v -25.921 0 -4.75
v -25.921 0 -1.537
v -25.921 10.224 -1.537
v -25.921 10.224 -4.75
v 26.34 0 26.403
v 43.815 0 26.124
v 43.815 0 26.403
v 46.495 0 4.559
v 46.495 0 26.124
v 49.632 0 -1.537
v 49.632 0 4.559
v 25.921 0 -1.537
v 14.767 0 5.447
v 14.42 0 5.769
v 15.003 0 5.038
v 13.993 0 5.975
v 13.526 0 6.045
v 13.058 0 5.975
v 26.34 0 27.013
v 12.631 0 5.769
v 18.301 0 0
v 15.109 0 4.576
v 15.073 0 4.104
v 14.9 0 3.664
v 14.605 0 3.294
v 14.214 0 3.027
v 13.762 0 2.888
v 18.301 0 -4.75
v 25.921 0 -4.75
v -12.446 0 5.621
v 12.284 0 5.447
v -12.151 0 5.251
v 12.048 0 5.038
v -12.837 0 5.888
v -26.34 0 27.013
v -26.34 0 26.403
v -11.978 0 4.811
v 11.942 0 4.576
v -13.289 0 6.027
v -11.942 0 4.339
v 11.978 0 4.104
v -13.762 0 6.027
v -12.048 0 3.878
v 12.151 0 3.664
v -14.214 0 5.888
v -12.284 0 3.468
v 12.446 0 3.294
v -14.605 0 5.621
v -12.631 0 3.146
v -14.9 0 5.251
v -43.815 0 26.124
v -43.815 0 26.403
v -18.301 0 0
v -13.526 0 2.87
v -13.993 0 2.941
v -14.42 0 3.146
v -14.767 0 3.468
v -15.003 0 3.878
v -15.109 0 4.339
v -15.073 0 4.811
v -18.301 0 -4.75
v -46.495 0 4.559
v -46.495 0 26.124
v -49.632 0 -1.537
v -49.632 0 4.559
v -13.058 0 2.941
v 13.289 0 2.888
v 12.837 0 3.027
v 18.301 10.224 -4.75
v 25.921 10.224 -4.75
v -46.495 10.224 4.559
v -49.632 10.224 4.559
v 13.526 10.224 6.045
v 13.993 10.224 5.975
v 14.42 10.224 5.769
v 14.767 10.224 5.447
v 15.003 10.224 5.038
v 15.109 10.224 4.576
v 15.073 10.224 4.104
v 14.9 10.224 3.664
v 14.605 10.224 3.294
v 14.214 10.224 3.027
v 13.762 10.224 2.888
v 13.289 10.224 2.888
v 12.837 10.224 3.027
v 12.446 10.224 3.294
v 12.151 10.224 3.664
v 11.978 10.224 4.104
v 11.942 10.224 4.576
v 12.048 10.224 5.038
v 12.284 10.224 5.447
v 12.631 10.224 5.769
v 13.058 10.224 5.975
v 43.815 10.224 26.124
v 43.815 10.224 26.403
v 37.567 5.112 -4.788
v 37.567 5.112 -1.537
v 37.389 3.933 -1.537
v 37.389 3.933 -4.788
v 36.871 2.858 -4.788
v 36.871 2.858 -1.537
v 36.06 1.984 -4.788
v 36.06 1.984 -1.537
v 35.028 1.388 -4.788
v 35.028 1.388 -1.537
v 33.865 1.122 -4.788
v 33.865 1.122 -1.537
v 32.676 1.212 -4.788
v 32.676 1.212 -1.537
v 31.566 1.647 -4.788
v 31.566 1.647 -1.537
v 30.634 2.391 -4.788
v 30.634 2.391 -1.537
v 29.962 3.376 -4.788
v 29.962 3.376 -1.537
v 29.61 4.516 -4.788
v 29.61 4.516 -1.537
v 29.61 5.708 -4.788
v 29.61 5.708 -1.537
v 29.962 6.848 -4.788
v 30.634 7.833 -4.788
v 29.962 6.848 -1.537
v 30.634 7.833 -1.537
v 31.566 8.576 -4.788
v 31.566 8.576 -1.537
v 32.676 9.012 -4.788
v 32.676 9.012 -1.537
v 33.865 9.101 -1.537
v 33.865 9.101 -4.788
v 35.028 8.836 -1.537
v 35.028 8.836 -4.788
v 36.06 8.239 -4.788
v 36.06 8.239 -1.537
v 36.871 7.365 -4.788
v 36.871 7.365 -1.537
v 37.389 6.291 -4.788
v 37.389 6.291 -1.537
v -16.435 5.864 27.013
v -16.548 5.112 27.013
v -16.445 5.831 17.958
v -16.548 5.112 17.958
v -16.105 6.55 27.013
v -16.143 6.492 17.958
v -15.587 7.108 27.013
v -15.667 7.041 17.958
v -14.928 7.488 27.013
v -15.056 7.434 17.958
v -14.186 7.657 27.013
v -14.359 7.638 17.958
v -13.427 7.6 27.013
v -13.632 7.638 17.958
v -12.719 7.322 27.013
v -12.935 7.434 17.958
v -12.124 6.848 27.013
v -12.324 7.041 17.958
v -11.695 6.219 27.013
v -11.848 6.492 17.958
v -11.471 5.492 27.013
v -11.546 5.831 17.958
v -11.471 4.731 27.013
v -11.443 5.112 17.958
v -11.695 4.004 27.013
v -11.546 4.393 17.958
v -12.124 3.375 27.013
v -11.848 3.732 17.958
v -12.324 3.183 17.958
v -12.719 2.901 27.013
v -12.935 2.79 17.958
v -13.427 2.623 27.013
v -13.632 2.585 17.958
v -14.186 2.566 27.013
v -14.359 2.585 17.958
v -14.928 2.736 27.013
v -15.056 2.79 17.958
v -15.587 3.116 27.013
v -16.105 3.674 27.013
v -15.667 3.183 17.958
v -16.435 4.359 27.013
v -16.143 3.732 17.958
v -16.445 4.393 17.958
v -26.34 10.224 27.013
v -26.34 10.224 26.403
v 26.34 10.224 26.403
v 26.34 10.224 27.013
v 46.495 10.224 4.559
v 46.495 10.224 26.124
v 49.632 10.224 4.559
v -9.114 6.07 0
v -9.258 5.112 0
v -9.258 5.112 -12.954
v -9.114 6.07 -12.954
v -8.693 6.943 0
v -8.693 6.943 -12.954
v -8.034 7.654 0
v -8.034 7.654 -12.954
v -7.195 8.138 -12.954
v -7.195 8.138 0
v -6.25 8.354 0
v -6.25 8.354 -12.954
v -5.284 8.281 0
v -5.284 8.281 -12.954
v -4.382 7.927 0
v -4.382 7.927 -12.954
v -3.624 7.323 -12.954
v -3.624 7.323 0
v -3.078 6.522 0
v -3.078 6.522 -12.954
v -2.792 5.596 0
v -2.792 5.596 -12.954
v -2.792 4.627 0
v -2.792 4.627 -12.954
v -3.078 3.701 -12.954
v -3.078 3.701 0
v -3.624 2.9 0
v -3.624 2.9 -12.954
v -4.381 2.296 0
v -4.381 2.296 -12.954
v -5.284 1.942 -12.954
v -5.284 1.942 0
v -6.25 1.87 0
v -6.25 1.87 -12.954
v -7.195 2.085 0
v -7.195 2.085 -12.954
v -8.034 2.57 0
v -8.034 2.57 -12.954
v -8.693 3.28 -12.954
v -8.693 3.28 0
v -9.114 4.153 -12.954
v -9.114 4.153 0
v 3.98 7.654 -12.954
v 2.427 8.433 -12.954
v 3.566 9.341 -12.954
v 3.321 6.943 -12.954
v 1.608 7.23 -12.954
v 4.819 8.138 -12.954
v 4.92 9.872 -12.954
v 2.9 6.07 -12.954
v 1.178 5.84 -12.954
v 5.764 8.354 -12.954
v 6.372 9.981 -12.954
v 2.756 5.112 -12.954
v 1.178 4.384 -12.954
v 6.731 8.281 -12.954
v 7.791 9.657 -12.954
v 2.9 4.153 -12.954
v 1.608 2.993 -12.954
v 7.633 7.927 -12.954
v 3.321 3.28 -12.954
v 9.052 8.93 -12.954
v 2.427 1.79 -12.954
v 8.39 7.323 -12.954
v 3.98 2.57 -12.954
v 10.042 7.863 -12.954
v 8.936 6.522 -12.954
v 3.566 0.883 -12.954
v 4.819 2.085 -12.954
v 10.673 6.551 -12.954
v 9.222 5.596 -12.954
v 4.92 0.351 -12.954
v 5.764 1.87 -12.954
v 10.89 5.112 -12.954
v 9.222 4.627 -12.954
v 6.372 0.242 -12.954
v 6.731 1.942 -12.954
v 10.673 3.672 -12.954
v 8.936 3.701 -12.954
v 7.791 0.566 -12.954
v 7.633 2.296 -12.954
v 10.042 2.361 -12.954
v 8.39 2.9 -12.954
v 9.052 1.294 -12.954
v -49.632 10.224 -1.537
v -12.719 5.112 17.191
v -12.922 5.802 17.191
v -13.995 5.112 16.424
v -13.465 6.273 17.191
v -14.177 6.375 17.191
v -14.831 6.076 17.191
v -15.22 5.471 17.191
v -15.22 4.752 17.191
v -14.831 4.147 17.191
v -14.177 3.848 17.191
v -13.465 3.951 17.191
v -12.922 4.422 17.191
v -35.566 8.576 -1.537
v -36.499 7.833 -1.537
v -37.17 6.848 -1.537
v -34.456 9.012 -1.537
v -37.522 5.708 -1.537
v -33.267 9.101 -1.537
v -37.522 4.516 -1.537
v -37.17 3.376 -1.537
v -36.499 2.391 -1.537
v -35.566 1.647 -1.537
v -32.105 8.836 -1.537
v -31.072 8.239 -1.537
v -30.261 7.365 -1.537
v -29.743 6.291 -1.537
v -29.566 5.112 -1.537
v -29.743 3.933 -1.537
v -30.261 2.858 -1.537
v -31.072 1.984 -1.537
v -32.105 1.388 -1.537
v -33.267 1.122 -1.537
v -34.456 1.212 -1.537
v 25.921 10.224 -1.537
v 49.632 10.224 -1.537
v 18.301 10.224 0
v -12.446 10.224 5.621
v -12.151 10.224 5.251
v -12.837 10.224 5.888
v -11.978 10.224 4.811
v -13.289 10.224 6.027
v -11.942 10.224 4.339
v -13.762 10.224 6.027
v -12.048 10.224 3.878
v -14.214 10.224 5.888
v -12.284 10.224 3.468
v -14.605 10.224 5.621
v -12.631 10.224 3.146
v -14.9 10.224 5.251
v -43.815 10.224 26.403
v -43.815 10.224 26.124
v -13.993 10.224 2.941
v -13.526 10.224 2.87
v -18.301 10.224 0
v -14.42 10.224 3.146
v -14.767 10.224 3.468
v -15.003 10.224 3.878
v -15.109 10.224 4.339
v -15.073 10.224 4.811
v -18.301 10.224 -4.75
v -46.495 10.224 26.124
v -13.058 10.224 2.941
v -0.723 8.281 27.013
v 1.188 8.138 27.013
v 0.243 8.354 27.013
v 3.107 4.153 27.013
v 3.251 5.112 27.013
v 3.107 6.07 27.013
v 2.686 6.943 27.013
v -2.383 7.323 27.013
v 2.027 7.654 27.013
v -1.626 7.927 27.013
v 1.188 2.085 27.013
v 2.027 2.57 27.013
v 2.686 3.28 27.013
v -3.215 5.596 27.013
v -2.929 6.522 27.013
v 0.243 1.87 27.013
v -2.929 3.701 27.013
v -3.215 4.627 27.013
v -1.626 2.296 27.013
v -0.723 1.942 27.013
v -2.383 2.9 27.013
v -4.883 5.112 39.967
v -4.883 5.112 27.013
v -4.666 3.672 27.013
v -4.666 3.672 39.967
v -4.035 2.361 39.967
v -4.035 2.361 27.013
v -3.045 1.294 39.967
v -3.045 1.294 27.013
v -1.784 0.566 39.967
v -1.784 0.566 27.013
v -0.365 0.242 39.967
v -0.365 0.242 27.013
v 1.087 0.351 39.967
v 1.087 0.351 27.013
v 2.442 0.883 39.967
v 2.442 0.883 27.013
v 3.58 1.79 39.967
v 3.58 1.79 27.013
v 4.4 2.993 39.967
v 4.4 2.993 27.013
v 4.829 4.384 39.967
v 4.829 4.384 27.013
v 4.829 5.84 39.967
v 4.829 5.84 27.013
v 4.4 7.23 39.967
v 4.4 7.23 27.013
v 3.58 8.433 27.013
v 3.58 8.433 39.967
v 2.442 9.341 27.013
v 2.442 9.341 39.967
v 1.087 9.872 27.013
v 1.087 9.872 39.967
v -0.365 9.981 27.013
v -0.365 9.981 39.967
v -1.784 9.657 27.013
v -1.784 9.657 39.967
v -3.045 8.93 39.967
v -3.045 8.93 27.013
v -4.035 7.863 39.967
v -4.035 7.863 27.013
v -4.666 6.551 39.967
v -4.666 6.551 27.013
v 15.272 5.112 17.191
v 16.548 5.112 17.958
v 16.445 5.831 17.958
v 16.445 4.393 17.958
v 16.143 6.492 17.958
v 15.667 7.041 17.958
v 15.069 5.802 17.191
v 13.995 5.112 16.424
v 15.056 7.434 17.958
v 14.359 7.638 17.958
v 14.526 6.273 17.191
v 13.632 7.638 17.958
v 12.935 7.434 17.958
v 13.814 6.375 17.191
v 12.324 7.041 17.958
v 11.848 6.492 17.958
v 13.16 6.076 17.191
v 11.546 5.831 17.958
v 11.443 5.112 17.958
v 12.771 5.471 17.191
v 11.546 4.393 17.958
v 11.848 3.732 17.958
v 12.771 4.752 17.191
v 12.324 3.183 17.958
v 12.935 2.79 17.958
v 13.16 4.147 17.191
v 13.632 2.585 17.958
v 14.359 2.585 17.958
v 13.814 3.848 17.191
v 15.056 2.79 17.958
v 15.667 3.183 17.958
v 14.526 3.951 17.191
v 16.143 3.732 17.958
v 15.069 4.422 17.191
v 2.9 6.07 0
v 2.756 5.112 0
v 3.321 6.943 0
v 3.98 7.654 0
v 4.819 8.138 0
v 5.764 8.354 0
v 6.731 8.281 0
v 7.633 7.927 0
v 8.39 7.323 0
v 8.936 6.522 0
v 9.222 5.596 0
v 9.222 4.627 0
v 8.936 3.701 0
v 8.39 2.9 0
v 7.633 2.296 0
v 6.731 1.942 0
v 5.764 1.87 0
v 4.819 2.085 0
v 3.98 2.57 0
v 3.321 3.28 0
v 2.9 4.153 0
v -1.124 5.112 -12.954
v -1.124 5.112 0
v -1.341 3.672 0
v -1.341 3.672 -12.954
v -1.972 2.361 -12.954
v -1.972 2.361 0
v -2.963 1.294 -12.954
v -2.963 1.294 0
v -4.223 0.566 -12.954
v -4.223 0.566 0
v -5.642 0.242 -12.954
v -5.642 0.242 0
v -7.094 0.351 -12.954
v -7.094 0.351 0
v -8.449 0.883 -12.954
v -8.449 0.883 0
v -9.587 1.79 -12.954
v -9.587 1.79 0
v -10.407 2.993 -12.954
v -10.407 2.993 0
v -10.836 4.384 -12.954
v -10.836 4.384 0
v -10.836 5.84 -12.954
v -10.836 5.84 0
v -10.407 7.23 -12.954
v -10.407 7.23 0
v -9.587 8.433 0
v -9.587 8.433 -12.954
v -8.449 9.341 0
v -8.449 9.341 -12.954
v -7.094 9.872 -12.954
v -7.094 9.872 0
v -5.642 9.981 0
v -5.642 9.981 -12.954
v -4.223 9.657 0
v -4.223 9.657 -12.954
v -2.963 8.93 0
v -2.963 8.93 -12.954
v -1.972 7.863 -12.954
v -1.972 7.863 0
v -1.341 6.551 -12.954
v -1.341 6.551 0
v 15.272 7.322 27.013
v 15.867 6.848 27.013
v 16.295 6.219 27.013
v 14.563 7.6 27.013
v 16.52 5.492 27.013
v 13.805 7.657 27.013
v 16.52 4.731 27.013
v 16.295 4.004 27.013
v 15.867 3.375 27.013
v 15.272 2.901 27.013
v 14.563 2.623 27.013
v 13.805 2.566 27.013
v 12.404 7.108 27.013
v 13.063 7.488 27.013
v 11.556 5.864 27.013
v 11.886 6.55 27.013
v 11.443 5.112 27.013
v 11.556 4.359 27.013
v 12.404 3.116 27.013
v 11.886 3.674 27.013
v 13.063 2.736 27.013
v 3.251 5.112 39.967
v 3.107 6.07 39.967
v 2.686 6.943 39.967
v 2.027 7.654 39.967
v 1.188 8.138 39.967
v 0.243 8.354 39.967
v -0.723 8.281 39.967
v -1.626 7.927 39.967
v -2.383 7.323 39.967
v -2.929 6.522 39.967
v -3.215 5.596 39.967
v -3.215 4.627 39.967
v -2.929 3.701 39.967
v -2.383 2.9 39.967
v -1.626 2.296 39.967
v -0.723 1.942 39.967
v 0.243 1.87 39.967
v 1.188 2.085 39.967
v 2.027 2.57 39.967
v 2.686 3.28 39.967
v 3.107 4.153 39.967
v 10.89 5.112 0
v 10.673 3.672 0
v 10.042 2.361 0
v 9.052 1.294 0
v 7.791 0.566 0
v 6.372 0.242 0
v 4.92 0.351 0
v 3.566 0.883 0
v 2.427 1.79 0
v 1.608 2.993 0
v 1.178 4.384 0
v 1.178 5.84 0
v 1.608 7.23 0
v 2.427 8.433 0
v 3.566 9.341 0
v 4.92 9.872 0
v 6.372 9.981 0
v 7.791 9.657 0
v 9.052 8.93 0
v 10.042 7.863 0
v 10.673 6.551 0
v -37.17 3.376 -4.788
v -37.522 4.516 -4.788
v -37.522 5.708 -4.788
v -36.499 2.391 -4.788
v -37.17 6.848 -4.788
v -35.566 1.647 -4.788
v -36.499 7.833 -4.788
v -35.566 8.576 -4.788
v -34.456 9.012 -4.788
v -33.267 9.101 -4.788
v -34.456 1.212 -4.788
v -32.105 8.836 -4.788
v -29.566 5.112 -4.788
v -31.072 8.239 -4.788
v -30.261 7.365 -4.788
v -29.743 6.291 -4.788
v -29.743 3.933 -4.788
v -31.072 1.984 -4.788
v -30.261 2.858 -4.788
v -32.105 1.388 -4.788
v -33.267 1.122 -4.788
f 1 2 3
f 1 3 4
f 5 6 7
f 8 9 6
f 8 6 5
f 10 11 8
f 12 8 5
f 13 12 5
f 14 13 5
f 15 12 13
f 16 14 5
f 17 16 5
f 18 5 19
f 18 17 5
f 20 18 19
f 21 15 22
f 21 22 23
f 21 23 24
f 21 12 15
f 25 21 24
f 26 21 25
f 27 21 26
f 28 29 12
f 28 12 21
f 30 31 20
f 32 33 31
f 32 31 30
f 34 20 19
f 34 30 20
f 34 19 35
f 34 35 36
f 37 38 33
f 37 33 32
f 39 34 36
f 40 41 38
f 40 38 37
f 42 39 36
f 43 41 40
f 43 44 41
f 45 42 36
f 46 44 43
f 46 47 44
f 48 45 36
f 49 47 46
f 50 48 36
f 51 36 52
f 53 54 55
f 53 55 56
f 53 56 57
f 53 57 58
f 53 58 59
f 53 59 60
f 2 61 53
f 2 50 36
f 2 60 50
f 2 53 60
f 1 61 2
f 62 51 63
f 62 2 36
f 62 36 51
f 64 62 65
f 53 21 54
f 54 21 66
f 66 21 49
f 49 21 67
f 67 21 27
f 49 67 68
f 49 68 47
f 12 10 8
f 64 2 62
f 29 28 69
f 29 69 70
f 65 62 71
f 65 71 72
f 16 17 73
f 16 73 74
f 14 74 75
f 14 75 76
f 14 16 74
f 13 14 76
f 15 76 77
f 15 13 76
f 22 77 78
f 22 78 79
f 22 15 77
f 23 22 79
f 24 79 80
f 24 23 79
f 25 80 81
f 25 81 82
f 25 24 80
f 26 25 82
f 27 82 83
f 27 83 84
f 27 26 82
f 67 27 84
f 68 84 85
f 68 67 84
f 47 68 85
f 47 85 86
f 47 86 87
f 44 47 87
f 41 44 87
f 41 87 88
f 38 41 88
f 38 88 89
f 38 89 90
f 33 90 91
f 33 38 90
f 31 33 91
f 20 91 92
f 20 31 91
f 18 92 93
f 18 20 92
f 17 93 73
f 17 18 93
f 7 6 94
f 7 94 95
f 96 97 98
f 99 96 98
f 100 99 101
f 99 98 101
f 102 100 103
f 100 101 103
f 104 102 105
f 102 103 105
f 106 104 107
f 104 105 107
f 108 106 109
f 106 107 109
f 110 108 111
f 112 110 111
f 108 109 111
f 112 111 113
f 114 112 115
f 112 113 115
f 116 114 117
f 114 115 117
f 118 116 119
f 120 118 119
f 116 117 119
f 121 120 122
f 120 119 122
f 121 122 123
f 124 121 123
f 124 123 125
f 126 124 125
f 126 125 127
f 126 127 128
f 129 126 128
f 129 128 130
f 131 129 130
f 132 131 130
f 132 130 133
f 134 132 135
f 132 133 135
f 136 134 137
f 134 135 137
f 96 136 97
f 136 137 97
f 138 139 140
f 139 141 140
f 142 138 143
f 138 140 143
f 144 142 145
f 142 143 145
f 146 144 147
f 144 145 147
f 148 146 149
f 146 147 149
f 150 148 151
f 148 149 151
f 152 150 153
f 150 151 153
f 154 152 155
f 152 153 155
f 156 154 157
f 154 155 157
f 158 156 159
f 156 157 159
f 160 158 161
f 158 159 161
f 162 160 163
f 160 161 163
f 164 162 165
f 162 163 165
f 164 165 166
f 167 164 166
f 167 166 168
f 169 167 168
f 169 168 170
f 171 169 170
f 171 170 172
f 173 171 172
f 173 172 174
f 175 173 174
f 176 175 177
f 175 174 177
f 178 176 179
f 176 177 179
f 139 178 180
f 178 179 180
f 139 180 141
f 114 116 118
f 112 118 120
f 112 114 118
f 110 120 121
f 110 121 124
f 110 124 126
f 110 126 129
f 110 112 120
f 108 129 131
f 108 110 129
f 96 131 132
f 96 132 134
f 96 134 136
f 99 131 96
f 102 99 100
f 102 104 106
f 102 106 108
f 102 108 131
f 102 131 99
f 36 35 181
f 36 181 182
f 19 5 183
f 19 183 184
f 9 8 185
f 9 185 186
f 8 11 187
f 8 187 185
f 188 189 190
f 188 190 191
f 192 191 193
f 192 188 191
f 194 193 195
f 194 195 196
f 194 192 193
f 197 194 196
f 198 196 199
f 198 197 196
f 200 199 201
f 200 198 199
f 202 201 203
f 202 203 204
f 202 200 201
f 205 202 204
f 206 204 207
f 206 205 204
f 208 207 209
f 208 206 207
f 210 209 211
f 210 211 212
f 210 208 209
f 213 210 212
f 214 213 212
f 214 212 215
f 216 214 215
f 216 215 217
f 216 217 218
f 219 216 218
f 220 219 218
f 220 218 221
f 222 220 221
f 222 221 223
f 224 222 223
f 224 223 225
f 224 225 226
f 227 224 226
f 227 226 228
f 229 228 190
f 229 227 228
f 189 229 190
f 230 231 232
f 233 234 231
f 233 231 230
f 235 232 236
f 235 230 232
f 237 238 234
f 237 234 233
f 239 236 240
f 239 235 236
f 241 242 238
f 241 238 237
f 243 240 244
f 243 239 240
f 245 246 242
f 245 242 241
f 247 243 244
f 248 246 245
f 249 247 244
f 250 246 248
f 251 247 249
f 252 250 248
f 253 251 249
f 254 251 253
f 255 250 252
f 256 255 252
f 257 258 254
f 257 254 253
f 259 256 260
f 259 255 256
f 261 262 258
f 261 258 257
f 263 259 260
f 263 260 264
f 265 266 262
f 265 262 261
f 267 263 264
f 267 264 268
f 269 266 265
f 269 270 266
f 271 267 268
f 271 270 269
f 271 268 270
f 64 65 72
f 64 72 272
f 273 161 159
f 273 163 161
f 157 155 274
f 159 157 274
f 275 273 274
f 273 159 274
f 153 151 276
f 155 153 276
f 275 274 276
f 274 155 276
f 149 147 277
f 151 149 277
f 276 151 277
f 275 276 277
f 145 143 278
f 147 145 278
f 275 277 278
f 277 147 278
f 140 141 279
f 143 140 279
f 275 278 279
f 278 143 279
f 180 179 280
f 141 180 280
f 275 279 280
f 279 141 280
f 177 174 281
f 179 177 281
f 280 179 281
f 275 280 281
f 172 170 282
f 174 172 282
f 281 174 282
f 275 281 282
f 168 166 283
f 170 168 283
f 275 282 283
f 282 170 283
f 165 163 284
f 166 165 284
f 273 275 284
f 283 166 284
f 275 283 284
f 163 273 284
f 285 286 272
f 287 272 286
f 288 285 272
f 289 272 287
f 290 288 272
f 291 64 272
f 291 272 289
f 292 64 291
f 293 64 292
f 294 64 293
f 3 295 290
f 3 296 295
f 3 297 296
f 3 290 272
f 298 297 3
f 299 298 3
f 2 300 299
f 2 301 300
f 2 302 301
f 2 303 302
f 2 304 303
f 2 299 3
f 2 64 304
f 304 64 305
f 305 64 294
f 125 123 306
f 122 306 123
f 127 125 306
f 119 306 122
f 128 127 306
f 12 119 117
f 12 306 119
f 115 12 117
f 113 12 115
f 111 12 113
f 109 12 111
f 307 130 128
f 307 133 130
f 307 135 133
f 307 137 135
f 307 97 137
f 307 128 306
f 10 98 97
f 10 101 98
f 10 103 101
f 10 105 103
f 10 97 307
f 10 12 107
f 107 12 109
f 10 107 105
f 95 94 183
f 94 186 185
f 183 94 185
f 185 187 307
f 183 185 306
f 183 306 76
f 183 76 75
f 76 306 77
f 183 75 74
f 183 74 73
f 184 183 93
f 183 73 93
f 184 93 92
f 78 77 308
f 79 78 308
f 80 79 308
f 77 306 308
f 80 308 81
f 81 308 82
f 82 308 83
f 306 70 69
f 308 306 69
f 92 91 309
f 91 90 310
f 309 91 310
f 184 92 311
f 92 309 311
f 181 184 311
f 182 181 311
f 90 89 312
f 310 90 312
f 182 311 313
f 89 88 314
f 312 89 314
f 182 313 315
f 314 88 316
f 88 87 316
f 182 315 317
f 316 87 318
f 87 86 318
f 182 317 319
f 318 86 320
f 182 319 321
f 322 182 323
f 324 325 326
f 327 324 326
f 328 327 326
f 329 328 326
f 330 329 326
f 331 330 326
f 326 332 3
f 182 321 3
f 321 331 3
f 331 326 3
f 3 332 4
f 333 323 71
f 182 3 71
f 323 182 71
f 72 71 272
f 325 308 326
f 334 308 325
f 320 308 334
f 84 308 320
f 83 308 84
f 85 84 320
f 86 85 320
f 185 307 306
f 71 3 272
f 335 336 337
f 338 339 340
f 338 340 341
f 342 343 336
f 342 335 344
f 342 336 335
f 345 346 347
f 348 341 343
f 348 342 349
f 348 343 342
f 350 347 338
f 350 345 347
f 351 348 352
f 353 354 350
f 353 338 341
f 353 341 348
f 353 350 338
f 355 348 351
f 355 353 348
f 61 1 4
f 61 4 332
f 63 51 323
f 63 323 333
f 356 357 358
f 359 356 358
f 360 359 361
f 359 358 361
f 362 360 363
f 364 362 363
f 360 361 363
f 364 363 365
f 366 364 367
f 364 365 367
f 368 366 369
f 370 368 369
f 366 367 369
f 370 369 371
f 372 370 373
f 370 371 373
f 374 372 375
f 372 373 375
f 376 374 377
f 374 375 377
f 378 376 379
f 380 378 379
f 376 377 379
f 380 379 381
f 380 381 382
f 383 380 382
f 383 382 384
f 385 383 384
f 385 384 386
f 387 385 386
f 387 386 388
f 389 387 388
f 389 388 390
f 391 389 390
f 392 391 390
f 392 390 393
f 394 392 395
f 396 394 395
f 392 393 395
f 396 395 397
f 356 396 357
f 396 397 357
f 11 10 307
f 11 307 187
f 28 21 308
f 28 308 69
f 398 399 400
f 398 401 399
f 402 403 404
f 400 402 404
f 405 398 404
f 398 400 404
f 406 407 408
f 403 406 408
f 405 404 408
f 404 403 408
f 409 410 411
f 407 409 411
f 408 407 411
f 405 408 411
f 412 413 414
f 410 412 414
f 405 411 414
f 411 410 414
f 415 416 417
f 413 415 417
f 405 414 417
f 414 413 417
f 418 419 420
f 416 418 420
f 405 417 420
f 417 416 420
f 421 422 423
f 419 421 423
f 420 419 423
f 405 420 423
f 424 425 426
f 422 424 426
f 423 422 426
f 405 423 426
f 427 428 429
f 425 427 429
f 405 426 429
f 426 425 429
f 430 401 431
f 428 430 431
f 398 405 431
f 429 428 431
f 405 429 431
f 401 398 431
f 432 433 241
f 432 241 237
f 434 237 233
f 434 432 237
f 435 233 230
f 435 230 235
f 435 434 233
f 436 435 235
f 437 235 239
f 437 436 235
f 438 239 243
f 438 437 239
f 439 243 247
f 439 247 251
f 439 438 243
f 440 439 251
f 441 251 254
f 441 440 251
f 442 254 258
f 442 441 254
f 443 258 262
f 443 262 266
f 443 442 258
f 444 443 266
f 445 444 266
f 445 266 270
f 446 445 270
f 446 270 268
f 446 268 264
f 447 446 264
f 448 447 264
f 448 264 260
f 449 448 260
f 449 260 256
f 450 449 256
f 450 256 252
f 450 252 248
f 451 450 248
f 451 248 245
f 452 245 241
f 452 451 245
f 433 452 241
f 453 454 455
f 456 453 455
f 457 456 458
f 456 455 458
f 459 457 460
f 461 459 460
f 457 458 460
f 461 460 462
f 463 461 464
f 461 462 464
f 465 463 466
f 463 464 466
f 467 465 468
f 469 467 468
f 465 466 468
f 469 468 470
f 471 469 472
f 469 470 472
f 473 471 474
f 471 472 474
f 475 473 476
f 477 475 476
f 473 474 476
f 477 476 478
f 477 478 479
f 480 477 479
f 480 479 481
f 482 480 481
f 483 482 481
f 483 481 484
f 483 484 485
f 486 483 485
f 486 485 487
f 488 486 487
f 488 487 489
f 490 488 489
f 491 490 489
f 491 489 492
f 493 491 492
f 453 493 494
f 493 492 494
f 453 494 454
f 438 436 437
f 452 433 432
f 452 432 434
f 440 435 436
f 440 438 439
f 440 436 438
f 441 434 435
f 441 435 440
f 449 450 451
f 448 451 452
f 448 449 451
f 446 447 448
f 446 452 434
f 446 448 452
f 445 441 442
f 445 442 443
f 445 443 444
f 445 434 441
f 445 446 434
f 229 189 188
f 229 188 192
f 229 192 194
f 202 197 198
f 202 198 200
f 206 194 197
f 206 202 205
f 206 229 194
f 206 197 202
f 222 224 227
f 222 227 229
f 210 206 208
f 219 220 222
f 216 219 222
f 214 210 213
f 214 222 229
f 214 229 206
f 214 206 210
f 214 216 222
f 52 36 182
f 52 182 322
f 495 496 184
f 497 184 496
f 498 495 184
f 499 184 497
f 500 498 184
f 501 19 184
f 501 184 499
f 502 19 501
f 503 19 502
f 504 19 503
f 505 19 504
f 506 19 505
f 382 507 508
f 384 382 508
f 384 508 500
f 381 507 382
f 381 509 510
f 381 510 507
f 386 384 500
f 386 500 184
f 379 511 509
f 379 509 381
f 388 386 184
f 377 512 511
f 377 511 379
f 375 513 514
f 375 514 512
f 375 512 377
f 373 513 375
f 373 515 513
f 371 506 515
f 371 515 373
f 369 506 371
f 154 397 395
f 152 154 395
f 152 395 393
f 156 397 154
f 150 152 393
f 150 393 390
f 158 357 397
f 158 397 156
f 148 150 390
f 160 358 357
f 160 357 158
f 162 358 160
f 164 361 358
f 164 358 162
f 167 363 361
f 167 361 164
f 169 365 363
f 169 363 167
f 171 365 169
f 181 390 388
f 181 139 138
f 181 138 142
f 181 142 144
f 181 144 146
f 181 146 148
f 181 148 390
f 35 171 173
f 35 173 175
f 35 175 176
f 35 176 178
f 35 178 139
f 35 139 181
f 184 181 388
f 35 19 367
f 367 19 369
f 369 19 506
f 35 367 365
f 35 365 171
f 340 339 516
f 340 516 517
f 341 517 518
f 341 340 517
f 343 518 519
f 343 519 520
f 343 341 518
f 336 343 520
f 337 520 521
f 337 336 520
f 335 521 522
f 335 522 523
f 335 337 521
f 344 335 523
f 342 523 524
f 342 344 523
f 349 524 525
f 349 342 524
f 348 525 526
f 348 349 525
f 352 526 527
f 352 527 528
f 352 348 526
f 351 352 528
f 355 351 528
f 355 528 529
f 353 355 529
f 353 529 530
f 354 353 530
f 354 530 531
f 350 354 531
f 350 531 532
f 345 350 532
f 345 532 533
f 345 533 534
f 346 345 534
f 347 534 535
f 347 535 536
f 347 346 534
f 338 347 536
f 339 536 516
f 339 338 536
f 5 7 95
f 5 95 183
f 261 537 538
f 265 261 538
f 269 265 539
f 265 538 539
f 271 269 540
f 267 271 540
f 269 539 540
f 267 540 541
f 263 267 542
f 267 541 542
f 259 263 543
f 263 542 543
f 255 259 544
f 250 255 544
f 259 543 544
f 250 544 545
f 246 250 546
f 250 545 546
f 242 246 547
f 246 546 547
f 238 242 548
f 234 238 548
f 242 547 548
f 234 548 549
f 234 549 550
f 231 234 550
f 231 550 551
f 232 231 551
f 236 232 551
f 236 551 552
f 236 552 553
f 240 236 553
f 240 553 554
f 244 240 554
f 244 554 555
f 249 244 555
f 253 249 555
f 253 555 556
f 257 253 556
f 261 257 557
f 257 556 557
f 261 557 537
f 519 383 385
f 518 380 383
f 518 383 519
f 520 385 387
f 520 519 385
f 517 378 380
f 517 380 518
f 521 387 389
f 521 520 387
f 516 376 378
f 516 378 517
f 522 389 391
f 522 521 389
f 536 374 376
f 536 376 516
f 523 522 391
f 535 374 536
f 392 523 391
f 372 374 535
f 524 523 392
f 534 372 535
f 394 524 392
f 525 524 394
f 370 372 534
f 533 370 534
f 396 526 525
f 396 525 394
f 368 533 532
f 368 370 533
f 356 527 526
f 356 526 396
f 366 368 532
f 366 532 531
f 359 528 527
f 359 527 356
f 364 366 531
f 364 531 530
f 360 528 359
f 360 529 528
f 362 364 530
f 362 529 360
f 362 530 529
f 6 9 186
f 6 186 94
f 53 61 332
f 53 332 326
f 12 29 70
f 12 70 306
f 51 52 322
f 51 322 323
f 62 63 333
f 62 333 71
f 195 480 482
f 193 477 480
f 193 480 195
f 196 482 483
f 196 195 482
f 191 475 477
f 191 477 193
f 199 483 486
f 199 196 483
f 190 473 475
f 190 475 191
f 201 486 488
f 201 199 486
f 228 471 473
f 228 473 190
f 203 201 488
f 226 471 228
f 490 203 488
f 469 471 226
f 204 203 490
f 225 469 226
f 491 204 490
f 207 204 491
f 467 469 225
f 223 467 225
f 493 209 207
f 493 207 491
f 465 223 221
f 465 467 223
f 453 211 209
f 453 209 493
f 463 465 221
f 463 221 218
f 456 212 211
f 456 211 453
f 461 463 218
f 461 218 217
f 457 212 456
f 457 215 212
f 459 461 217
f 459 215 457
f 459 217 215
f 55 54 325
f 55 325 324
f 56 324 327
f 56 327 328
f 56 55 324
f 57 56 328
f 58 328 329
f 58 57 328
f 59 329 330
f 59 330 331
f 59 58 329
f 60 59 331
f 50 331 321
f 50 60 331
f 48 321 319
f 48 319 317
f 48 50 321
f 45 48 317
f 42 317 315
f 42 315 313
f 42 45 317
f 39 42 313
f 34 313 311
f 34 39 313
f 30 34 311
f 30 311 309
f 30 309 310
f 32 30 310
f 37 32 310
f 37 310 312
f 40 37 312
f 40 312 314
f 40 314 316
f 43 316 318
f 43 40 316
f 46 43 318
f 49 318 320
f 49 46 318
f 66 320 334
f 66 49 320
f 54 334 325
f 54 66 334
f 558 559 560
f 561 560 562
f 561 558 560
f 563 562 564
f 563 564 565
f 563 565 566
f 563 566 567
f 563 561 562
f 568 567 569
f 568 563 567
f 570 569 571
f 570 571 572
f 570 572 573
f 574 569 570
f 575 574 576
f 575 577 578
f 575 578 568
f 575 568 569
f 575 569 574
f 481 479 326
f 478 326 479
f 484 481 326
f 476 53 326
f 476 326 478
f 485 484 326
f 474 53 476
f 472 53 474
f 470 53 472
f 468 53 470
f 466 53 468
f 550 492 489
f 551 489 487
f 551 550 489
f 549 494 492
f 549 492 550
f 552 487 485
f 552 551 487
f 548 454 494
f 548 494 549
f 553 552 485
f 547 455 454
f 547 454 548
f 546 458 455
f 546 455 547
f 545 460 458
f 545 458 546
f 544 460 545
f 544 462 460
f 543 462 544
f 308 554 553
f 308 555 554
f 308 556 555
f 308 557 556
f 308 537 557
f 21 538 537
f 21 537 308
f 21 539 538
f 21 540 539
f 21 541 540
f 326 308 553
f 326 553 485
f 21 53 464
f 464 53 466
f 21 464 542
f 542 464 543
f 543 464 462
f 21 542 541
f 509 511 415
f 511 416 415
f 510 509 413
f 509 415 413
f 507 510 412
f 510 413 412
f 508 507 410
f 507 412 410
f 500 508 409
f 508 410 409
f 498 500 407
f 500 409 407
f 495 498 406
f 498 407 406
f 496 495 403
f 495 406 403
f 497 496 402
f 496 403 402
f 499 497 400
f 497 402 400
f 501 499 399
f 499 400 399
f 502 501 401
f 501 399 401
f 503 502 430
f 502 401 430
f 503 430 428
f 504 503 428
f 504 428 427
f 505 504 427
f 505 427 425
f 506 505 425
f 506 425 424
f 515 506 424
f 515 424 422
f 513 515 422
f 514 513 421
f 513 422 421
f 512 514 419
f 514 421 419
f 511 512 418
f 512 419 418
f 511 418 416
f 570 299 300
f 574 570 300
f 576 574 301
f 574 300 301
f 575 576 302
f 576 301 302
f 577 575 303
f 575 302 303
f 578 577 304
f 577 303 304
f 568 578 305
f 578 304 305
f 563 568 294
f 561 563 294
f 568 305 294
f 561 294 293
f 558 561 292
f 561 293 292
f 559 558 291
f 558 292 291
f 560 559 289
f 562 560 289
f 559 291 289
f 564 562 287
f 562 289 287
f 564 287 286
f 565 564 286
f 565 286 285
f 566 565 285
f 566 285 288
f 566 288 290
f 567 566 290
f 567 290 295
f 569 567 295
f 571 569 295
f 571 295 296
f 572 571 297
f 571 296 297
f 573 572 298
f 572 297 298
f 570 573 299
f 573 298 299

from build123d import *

# Parameters (mm, degrees)
SKETCH1_R                       = 1.5875
BOSS_EXTRUDE1_DEPTH             = 10.2235
SKETCH2_R                       = 4.88315
SKETCH2_R_2                     = 3.2512
BOSS_EXTRUDE2_DEPTH             = 12.954
SKETCH3_R                       = 4.88315
SKETCH3_R_2                     = 3.2512
BOSS_EXTRUDE3_DEPTH             = 12.954
TAP_DRILL_FOR_1_4_20_TAP1_D     = 5.1054
TAP_DRILL_FOR_1_4_20_TAP1_DEPTH = 9.0551
TAP_DRILL_FOR_1_4_20_TAP1_TIP   = 1.533816902
SKETCH6_R                       = 4.0005
BOSS_EXTRUDE4_DEPTH             = 3.2512


with BuildPart() as part:
    # Sketch1 → Boss-Extrude1 (new body)
    with BuildSketch(Plane(origin=(0, 0, 0), x_dir=(1, 0, 0), z_dir=(0, 1, 0))):
        Polygon((-18.3007, 0), (18.3007, 0), (18.3007, 4.7498), (25.9207, 4.7498), (25.9207, 1.5367), (49.6316, 1.5367), (49.6316, -4.5593), (46.4947, -4.5593), (46.4947, -26.1239), (43.815, -26.1239), (43.815, -26.4033), (26.3398, -26.4033), (26.3398, -27.0129), (-26.3398, -27.0129), (-26.3398, -26.4033), (-43.815, -26.4033), (-43.815, -26.1239), (-46.4947, -26.1239), (-46.4947, -4.5593), (-49.6316, -4.5593), (-49.6316, 1.5367), (-25.9207, 1.5367), (-25.9207, 4.7498), (-18.3007, 4.7498), align=None)
        with Locations(Location((13.5255, -4.4577, 0), (0, 0, 270))):
            Circle(SKETCH1_R, mode=Mode.SUBTRACT)
        with Locations(Location((-13.5255, -4.4577, 0), (0, 0, 90))):
            Circle(SKETCH1_R, mode=Mode.SUBTRACT)
    extrude(amount=BOSS_EXTRUDE1_DEPTH)

    # Sketch2 → Boss-Extrude2 (add)
    with BuildSketch(Plane.XY.offset(27.0129)):
        with Locations(Location((0, 5.11175, 0), (0, 0, 180))):
            Circle(SKETCH2_R)
        with Locations((0, 5.11175)):
            Circle(SKETCH2_R_2, mode=Mode.SUBTRACT)
    extrude(amount=BOSS_EXTRUDE2_DEPTH)

    # Sketch3 → Boss-Extrude3 (add)
    # profile 1 of 2: a face of its own
    with BuildSketch(Plane(origin=(0, 0, 0), x_dir=(-1, 0, 0), z_dir=(0, 0, -1))):
        with Locations(Location((6.0071, 5.11175, 0), (0, 0, 180))):
            Circle(SKETCH3_R)
        with Locations((6.0071, 5.11175)):
            Circle(SKETCH3_R_2, mode=Mode.SUBTRACT)
    # profile 2 of 2: a face of its own
    with BuildSketch(Plane(origin=(0, 0, 0), x_dir=(-1, 0, 0), z_dir=(0, 0, -1))):
        with Locations(Location((-6.0071, 5.11175, 0), (0, 0, 180))):
            Circle(SKETCH3_R)
        with Locations((-6.0071, 5.11175)):
            Circle(SKETCH3_R_2, mode=Mode.SUBTRACT)
    extrude(amount=BOSS_EXTRUDE3_DEPTH)

    # Tap Drill for 1/4-20 Tap1
    with Locations(Plane.XY.offset(27.0129)):
        with Locations((-13.9954, 5.11175), (13.9954, 5.11175)):
            Hole(TAP_DRILL_FOR_1_4_20_TAP1_D / 2, depth=TAP_DRILL_FOR_1_4_20_TAP1_DEPTH)
            with Locations((0, 0, -(TAP_DRILL_FOR_1_4_20_TAP1_DEPTH + TAP_DRILL_FOR_1_4_20_TAP1_TIP / 2))):  # 118° drill point
                Cone(0, TAP_DRILL_FOR_1_4_20_TAP1_D / 2, TAP_DRILL_FOR_1_4_20_TAP1_TIP, mode=Mode.SUBTRACT)

    # Sketch6 → Boss-Extrude4 (add)
    with BuildSketch(Plane(origin=(0, 0, -1.5367), x_dir=(-1, 0, 0), z_dir=(0, 0, -1))):
        with Locations(Location((-33.5661, 5.11175, 0), (0, 0, 180))):
            Circle(SKETCH6_R)
        with Locations(Location((33.5661, 5.11175, 0), (0, 0, 180))):
            Circle(SKETCH6_R)
    extrude(amount=BOSS_EXTRUDE4_DEPTH)


solid = part.part
